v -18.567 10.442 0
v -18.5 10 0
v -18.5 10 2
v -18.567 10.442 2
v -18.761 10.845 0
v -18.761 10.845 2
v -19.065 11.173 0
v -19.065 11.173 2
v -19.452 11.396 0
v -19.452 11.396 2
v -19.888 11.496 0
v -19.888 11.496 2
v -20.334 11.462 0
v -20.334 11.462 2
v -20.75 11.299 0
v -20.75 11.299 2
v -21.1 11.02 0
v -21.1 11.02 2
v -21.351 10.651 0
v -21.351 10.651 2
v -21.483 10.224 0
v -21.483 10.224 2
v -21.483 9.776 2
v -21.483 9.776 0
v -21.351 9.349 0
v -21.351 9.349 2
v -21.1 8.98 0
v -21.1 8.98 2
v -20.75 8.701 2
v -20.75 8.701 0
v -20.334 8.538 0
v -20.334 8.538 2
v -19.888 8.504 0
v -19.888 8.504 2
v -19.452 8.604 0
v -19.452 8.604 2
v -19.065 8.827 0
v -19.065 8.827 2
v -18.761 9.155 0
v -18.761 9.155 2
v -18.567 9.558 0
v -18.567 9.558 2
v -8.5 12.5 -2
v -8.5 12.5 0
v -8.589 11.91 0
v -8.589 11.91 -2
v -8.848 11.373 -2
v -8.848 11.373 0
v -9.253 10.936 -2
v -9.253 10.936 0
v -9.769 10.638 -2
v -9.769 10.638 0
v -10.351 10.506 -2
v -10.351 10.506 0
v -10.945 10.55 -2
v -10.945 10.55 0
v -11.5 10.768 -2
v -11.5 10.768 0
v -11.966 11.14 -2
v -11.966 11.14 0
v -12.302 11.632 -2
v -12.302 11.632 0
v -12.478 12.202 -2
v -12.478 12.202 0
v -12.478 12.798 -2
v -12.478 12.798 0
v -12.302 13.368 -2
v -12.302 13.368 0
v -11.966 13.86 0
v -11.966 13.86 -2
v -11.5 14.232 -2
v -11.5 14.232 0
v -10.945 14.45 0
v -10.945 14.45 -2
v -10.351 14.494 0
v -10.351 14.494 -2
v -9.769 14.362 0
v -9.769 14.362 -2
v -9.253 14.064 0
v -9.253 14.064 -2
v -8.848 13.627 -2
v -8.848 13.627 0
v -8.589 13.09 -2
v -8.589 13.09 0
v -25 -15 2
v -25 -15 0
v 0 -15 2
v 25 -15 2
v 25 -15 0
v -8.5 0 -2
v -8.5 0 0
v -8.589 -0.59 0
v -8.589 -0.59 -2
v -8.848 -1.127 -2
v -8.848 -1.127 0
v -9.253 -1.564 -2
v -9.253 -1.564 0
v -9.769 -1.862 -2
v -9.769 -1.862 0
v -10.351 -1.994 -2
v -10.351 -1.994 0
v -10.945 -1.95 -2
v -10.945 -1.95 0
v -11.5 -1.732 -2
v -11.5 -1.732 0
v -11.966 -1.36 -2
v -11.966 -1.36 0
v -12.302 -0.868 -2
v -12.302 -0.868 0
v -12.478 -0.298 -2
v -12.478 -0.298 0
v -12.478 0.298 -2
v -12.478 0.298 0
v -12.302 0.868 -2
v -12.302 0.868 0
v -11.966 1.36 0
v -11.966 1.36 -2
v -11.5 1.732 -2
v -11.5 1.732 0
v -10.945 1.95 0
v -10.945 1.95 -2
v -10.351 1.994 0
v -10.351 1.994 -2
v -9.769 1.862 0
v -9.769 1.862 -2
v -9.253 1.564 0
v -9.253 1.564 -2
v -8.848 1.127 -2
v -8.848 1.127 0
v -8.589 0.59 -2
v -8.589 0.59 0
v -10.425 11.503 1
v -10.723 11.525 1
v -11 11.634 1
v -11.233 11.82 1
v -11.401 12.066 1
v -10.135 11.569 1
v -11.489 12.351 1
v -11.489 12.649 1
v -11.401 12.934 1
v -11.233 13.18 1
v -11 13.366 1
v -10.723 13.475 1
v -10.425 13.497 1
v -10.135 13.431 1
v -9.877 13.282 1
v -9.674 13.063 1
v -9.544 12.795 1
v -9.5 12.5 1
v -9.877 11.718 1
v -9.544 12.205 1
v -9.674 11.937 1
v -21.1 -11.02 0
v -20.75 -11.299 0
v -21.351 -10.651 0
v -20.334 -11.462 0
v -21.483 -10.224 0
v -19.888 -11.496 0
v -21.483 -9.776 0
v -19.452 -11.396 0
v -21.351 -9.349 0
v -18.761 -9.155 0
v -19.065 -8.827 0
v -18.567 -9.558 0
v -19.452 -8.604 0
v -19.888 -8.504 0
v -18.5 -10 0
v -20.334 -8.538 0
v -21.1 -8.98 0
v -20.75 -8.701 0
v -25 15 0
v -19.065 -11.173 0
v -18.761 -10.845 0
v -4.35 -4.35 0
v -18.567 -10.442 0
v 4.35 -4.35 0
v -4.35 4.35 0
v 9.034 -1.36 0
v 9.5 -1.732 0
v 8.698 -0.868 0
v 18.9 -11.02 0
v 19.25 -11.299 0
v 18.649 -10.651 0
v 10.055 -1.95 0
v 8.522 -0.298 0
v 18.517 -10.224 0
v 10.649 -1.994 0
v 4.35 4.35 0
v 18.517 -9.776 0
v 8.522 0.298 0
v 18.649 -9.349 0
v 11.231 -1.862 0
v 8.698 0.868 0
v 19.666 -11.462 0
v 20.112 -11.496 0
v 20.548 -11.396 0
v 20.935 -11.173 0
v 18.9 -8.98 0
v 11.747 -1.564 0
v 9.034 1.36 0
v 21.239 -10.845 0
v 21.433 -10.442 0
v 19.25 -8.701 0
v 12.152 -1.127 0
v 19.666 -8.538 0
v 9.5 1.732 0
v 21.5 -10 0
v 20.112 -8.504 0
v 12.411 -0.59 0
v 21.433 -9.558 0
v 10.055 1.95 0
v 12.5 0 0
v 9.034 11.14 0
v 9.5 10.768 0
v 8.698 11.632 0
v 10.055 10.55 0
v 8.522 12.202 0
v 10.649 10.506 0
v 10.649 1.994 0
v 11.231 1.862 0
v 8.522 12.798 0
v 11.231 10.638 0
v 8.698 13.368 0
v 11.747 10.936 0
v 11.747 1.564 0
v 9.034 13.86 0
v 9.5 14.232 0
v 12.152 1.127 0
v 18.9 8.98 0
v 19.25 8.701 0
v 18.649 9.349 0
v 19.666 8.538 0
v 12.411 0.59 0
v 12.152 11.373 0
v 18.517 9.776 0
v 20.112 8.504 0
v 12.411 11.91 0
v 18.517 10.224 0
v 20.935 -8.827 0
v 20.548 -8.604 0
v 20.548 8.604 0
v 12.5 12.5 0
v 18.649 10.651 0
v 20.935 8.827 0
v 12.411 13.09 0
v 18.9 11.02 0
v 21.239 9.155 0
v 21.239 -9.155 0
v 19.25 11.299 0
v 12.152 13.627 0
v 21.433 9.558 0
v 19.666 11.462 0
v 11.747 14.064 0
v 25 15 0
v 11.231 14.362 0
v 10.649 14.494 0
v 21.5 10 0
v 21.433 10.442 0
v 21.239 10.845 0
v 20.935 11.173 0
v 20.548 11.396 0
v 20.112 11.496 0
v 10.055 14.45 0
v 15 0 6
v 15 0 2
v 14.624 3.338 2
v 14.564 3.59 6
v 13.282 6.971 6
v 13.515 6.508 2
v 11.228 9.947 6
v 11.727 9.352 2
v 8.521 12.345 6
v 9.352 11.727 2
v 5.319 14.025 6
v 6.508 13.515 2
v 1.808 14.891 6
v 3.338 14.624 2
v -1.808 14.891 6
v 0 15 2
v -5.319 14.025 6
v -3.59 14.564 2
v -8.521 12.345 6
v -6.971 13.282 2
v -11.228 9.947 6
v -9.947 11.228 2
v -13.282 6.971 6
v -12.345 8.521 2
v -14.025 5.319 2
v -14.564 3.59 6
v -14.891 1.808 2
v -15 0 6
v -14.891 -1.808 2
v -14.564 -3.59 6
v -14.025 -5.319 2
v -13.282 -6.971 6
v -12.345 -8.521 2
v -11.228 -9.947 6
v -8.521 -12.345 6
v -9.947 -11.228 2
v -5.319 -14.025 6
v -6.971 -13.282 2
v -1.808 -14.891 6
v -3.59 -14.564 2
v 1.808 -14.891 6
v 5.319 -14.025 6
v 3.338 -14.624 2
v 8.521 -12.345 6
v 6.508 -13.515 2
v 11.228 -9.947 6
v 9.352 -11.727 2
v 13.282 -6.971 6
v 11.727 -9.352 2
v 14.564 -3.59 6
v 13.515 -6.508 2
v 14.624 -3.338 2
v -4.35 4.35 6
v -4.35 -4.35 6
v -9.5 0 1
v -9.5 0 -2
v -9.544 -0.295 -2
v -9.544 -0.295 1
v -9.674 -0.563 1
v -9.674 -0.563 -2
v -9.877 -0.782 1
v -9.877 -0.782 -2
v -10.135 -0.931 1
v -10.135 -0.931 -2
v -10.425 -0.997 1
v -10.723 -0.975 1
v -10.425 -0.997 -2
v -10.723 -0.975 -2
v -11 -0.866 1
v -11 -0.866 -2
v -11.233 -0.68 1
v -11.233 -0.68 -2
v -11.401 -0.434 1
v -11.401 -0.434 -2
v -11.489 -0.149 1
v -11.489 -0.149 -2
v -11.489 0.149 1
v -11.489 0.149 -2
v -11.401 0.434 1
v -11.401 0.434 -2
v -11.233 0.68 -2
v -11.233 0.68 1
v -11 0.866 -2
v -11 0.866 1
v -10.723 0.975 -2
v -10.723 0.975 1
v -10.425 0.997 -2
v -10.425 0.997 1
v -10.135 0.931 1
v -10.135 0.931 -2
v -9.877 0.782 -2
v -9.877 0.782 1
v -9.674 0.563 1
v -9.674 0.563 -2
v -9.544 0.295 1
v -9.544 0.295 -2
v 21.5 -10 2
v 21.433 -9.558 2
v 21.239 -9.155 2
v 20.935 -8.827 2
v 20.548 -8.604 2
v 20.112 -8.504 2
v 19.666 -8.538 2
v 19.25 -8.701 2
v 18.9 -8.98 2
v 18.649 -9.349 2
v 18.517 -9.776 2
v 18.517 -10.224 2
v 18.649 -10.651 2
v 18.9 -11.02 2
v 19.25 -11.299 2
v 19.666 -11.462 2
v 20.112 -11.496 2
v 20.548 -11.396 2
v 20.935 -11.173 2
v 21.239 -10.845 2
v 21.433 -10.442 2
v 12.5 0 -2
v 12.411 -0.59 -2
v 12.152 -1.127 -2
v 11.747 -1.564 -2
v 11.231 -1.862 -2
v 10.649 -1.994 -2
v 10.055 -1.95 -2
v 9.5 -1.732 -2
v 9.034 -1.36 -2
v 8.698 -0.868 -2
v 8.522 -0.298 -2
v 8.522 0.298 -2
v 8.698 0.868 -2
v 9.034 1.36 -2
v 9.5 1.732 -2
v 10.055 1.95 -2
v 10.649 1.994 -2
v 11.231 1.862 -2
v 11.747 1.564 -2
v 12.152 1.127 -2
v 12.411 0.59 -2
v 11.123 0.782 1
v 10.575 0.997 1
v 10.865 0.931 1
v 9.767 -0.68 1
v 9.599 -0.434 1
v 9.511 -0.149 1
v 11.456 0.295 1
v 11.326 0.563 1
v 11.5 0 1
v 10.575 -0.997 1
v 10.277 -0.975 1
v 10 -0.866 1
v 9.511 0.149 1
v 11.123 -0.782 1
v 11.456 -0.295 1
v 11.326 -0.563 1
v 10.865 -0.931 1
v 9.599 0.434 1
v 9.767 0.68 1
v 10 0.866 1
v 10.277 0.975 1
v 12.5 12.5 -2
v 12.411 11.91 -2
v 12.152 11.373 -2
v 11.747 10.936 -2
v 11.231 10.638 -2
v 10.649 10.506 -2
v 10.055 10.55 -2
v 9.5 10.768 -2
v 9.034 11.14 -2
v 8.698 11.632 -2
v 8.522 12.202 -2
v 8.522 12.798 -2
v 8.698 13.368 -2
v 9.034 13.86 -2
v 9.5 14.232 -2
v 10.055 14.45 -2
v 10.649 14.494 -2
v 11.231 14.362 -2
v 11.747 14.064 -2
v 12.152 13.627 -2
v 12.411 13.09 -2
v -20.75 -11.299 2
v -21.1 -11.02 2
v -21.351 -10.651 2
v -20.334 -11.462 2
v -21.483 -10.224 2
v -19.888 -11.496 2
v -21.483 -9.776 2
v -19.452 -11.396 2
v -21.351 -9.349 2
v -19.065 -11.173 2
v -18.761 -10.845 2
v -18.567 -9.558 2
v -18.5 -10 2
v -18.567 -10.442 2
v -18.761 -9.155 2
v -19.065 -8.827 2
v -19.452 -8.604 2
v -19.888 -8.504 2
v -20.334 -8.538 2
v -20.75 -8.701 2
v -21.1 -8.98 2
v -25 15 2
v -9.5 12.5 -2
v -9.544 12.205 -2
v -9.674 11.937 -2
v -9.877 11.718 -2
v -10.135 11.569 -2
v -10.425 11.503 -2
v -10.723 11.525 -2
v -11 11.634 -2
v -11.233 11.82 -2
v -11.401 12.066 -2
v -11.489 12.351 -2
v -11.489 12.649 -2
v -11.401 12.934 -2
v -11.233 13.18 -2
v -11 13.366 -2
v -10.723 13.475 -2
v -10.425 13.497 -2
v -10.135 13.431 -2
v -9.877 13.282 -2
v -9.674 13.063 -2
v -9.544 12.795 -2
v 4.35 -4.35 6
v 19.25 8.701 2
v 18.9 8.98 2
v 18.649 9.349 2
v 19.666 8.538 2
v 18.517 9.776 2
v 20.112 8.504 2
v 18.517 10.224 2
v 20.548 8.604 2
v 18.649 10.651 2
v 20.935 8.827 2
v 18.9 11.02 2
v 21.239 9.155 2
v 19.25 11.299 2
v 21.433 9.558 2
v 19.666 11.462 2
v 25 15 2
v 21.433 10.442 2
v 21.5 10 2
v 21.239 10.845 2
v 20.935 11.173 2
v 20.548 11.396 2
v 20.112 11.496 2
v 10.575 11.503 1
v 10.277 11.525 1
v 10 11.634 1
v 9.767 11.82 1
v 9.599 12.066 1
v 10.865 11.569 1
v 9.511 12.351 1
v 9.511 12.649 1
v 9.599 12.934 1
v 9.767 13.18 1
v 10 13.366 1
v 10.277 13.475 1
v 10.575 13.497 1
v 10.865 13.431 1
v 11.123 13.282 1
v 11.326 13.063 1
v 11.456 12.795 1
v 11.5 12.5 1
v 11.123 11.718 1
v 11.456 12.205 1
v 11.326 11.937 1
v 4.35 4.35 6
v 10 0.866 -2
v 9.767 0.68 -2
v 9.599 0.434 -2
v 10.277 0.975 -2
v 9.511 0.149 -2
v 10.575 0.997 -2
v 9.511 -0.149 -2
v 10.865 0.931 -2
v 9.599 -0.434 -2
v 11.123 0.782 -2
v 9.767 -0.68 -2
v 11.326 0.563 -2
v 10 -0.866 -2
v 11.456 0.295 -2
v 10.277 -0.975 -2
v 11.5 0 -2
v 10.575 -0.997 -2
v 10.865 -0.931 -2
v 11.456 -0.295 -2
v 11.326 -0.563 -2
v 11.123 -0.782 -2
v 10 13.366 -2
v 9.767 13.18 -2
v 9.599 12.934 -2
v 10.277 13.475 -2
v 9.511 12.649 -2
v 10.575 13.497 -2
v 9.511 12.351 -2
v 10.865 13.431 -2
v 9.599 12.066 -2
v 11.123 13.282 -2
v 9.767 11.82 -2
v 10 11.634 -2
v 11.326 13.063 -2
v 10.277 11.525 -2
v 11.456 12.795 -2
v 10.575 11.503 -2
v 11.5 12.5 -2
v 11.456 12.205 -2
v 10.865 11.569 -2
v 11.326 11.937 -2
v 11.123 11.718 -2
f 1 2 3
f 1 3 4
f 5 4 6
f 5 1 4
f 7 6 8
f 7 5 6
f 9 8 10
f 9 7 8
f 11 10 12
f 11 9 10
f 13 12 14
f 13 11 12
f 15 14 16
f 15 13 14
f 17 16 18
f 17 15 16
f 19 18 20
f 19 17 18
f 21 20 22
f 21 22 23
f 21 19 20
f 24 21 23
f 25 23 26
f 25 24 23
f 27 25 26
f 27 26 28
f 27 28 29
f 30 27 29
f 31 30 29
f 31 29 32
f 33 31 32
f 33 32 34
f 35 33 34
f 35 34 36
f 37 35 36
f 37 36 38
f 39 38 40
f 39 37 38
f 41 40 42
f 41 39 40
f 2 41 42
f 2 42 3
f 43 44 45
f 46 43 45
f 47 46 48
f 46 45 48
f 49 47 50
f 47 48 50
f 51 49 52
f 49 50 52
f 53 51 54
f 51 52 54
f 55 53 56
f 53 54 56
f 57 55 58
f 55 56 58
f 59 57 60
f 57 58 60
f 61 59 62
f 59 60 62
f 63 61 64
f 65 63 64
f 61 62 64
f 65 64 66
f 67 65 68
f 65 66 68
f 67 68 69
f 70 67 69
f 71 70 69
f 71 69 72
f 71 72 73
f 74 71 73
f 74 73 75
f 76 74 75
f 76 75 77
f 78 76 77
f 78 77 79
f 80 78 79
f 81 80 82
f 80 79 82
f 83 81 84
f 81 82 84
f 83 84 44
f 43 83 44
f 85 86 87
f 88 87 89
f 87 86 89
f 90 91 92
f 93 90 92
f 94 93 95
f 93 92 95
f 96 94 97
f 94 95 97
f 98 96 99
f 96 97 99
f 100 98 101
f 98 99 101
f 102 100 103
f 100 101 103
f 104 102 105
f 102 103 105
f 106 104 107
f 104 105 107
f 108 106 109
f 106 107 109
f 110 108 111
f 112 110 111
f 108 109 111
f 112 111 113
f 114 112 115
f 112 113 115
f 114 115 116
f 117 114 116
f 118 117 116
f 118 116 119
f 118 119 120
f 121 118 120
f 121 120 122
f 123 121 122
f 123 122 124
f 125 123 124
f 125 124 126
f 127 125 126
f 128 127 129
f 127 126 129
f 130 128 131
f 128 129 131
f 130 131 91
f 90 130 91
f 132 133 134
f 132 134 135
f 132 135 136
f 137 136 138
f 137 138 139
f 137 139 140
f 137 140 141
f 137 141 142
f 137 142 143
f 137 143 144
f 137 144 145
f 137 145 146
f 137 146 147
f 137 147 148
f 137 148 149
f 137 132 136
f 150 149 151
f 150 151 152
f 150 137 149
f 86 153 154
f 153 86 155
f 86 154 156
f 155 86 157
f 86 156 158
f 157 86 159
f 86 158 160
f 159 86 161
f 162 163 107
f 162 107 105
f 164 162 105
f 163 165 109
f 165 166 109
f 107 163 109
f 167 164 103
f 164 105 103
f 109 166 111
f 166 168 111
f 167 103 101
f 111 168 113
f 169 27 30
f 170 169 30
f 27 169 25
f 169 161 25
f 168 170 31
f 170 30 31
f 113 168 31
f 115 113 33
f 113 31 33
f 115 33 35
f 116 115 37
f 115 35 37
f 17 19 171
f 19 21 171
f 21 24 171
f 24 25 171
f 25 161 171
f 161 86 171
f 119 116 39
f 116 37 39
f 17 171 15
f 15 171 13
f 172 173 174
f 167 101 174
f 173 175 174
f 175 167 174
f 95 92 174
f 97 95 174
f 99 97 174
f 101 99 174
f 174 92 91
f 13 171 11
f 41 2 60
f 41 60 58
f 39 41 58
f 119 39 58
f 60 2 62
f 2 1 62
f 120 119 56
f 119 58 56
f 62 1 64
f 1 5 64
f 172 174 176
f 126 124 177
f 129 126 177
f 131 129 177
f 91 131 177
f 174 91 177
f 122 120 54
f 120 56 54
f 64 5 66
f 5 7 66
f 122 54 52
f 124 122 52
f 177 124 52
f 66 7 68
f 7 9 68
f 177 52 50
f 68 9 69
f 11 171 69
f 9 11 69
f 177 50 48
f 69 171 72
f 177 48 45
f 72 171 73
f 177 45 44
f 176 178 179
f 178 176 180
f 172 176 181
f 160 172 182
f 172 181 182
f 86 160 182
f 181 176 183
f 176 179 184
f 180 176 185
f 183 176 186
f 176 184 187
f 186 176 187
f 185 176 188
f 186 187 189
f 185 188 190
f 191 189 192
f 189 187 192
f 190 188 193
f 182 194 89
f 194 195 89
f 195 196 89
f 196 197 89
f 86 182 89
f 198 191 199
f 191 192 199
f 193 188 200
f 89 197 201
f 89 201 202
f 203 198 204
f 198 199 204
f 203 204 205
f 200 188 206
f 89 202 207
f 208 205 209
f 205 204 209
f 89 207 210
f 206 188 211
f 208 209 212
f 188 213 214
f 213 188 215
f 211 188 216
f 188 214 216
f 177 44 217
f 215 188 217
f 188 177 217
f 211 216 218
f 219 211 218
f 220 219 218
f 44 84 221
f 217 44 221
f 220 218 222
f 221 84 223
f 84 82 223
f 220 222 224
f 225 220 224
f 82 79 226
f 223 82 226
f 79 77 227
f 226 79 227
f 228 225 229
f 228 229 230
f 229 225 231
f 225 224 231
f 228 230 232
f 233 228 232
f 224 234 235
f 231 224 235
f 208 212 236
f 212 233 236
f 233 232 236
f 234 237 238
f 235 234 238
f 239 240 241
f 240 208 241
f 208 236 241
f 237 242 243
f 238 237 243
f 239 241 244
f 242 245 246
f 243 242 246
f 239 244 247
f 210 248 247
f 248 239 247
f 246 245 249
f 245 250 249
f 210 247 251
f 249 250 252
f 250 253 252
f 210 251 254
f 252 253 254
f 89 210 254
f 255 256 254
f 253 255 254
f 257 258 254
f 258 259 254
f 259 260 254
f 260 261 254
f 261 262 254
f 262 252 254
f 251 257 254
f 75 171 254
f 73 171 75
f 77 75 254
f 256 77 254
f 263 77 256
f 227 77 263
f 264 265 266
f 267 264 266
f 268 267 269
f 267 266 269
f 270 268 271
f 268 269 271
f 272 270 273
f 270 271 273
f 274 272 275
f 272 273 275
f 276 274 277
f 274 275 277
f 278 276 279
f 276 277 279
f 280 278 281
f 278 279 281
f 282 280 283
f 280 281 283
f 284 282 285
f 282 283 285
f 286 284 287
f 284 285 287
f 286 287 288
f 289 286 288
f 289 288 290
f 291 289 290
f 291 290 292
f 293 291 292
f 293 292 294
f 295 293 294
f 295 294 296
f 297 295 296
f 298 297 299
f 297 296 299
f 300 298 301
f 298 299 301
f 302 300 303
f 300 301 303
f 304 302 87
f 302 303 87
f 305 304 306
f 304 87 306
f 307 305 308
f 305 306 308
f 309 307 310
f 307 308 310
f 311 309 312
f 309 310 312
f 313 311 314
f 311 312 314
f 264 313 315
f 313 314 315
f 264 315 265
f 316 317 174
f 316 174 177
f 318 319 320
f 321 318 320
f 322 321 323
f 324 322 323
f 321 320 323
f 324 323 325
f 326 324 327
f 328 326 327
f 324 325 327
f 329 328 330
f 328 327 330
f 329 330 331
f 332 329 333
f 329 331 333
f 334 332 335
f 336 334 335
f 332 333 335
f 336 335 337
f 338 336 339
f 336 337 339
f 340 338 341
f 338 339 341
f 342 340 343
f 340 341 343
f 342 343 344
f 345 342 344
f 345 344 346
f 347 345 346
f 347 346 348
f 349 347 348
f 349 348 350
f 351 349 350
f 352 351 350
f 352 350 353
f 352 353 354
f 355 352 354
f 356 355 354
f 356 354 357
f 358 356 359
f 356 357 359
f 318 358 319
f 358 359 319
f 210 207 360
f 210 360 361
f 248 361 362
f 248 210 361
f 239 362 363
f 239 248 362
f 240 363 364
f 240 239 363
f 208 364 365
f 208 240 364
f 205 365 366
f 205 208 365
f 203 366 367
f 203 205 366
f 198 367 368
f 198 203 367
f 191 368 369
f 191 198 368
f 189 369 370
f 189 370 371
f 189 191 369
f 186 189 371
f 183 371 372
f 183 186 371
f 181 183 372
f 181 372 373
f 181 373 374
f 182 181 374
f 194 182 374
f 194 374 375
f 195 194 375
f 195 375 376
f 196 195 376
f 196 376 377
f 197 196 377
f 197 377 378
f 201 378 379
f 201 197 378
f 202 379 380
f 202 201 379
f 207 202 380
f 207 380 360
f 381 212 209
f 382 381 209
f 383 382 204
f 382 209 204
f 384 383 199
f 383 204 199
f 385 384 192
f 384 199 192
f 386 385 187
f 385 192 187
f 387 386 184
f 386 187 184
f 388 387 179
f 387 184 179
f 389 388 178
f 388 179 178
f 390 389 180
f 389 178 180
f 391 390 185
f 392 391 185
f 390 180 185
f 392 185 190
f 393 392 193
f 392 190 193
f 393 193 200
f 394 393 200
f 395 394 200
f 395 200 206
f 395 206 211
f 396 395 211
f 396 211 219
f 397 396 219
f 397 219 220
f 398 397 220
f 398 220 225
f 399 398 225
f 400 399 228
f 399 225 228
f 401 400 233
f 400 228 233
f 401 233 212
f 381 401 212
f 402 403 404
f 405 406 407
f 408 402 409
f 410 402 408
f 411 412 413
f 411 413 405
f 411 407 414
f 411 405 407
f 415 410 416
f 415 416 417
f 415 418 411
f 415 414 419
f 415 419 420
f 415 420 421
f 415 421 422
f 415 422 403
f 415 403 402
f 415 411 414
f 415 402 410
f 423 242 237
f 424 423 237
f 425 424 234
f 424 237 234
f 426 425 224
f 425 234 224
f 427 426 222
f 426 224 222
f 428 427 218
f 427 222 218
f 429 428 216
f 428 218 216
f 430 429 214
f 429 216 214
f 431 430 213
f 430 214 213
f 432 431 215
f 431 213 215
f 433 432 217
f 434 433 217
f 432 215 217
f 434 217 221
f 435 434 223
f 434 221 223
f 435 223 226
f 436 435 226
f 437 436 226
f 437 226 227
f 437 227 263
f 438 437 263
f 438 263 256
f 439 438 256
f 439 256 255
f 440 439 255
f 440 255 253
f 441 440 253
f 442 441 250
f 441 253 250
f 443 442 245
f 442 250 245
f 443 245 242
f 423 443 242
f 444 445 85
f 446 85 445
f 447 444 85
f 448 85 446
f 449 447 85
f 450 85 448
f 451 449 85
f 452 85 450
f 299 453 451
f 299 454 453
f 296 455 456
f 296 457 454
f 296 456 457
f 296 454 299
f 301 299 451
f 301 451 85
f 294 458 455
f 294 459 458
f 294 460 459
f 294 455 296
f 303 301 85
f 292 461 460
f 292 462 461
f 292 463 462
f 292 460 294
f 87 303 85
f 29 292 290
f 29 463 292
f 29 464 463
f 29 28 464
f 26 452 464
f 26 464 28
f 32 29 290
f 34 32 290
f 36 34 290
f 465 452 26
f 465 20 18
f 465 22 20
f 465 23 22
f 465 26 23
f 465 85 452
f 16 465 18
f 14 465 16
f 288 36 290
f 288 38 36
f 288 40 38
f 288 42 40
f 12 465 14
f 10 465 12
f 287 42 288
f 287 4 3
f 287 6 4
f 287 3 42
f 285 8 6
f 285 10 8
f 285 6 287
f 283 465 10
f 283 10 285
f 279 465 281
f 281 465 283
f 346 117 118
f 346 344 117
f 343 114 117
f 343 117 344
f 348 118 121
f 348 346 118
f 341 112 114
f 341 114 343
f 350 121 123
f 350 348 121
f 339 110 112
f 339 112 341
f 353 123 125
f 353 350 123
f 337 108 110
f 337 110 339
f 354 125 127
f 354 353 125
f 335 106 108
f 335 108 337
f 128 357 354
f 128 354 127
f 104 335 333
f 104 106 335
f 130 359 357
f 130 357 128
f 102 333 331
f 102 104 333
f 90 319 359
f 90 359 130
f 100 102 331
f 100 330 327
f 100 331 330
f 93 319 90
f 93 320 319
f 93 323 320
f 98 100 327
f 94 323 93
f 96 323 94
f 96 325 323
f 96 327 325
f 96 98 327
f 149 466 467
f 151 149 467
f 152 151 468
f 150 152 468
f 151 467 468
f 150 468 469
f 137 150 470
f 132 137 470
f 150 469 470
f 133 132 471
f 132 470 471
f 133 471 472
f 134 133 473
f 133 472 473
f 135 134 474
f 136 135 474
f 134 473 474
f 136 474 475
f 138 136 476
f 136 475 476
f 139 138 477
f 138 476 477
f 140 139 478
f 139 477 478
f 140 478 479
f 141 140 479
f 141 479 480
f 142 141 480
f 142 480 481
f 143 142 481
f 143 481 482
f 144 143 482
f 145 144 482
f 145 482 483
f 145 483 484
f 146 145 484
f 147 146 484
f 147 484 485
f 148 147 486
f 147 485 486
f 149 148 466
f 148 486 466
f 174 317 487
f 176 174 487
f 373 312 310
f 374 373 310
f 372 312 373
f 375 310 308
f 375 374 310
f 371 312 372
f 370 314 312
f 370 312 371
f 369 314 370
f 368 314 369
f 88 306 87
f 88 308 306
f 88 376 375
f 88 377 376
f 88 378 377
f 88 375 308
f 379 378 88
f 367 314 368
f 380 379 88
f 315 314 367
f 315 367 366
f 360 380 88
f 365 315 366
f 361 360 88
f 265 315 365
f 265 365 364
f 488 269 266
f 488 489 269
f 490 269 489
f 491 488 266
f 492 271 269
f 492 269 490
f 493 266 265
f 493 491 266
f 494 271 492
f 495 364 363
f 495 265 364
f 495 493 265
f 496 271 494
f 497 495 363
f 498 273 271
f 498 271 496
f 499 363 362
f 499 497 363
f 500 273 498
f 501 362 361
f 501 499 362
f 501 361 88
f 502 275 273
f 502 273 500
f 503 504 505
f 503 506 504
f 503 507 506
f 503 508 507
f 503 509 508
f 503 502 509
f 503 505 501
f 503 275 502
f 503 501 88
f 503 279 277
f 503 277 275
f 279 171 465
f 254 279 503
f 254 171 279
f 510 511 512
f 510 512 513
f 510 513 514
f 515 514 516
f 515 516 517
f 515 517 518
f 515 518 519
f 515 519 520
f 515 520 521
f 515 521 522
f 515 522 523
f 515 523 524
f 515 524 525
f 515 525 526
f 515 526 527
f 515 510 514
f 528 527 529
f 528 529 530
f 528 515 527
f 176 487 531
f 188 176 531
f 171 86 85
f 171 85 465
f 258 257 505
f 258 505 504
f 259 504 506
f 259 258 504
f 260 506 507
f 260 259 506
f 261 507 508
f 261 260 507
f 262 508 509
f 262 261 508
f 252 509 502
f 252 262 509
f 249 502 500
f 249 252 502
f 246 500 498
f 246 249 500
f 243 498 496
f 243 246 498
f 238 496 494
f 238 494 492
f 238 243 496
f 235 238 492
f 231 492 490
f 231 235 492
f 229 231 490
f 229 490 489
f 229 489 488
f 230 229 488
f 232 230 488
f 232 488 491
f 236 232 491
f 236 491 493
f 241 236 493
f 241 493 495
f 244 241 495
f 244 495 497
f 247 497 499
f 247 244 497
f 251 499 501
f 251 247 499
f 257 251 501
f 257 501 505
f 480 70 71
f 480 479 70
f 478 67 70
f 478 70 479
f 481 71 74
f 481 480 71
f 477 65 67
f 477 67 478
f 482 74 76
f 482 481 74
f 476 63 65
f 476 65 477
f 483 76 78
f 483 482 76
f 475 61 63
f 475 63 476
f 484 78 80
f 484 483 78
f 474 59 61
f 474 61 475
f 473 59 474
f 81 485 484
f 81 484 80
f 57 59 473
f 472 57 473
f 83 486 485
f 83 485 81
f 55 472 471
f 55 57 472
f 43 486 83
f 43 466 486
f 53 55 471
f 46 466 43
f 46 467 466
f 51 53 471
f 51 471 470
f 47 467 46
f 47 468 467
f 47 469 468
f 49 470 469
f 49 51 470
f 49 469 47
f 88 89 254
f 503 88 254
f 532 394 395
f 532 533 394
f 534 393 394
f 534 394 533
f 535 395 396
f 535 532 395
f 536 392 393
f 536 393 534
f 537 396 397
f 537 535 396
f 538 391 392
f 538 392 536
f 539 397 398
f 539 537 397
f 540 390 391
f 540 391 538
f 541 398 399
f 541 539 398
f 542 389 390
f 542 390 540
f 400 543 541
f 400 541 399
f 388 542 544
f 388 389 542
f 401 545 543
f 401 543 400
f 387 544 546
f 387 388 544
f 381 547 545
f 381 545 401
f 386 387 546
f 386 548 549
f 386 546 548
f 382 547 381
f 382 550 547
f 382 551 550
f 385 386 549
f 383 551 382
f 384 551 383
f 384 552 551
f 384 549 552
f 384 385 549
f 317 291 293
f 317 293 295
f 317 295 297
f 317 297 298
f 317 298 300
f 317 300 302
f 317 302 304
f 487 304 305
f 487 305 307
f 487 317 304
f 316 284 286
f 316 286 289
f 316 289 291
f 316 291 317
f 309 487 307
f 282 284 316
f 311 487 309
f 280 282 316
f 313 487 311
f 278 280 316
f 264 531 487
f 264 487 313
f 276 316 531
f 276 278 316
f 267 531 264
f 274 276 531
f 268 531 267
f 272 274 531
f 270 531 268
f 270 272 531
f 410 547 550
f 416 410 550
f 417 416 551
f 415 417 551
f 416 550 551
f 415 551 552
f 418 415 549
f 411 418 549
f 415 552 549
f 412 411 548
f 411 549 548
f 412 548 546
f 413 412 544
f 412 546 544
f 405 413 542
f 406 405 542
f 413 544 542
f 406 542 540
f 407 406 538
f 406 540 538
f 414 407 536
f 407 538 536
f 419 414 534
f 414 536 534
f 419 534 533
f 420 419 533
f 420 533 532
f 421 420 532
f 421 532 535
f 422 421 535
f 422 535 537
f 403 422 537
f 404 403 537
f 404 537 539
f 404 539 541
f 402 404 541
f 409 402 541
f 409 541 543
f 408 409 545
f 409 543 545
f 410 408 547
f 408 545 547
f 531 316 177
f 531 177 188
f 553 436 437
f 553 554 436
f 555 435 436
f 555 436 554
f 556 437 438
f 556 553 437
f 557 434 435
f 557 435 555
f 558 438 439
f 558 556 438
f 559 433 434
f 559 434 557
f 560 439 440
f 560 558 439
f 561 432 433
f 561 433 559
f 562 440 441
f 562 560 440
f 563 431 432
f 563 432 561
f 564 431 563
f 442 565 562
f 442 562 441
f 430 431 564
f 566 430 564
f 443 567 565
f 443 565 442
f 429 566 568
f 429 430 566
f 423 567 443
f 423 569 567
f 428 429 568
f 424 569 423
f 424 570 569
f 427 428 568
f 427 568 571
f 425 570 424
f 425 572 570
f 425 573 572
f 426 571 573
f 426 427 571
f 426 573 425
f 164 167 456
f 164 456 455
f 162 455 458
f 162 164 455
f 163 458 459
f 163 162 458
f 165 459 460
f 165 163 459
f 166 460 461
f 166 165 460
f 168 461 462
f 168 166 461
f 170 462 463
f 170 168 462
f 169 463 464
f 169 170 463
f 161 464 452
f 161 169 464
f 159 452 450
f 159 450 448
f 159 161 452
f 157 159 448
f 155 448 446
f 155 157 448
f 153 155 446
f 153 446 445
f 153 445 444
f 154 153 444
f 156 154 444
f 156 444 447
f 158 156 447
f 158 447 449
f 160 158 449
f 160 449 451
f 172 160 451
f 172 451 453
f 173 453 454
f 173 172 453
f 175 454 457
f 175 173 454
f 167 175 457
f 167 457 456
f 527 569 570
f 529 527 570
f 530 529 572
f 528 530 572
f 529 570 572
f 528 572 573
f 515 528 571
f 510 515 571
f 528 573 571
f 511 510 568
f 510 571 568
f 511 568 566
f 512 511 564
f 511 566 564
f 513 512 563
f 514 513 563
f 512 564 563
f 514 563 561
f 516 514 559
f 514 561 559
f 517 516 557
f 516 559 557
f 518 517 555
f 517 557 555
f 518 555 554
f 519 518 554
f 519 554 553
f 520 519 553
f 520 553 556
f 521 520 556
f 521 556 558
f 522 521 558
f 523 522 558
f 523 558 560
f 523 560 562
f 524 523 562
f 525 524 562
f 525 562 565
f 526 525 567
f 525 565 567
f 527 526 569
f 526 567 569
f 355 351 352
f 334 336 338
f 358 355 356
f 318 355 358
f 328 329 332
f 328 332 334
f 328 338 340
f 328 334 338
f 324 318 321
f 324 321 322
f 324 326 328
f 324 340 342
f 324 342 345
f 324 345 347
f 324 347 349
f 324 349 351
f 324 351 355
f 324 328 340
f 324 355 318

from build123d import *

# Parameters (mm, degrees)
SKETCH_W        = 50
SKETCH_H        = 30
SKETCH_R        = 1.5
PAD_DEPTH       = 2
SKETCH001_R     = 15
PAD001_DEPTH    = 4
SKETCH002_W     = 8.7
SKETCH002_H     = 8.7
POCKET_DEPTH    = 7
SKETCH003_R     = 2
PAD002_DEPTH    = 2
SKETCH004_R     = 1
POCKET001_DEPTH = 3


with BuildPart() as part:
    # Sketch → Pad (new body)
    with BuildSketch(Plane.XY):
        Rectangle(SKETCH_W, SKETCH_H)
        with Locations((-20, 10)):
            Circle(SKETCH_R, mode=Mode.SUBTRACT)
        with Locations((-20, -10)):
            Circle(SKETCH_R, mode=Mode.SUBTRACT)
        with Locations((20, -10)):
            Circle(SKETCH_R, mode=Mode.SUBTRACT)
        with Locations((20, 10)):
            Circle(SKETCH_R, mode=Mode.SUBTRACT)
    extrude(amount=PAD_DEPTH)

    # Sketch001 → Pad001 (new body)
    with BuildSketch(Plane.XY.offset(2)):
        Circle(SKETCH001_R)
    extrude(amount=PAD001_DEPTH)

    # Sketch002 → Pocket (cut)
    with BuildSketch(Plane.XY.offset(6)):
        Rectangle(SKETCH002_W, SKETCH002_H)
    extrude(amount=-POCKET_DEPTH, mode=Mode.SUBTRACT)

    # Sketch003 → Pad002 (new body)
    with BuildSketch(Plane(origin=(0, 0, 0), x_dir=(1, 0, 0), z_dir=(0, 0, -1))):
        with Locations((-10.5, 0)):
            Circle(SKETCH003_R)
        with Locations((10.5, -12.5)):
            Circle(SKETCH003_R)
        with Locations((-10.5, -12.5)):
            Circle(SKETCH003_R)
        with Locations((10.5, 0)):
            Circle(SKETCH003_R)
    extrude(amount=PAD002_DEPTH)

    # Sketch004 → Pocket001 (cut)
    with BuildSketch(Plane(origin=(0, 0, -2), x_dir=(1, 0, 0), z_dir=(0, 0, -1))):
        with Locations((-10.5, 0)):
            Circle(SKETCH004_R)
        with Locations((10.5, 0)):
            Circle(SKETCH004_R)
        with Locations((10.5, -12.5)):
            Circle(SKETCH004_R)
        with Locations((-10.5, -12.5)):
            Circle(SKETCH004_R)
    extrude(amount=-POCKET001_DEPTH, mode=Mode.SUBTRACT)


solid = part.part
